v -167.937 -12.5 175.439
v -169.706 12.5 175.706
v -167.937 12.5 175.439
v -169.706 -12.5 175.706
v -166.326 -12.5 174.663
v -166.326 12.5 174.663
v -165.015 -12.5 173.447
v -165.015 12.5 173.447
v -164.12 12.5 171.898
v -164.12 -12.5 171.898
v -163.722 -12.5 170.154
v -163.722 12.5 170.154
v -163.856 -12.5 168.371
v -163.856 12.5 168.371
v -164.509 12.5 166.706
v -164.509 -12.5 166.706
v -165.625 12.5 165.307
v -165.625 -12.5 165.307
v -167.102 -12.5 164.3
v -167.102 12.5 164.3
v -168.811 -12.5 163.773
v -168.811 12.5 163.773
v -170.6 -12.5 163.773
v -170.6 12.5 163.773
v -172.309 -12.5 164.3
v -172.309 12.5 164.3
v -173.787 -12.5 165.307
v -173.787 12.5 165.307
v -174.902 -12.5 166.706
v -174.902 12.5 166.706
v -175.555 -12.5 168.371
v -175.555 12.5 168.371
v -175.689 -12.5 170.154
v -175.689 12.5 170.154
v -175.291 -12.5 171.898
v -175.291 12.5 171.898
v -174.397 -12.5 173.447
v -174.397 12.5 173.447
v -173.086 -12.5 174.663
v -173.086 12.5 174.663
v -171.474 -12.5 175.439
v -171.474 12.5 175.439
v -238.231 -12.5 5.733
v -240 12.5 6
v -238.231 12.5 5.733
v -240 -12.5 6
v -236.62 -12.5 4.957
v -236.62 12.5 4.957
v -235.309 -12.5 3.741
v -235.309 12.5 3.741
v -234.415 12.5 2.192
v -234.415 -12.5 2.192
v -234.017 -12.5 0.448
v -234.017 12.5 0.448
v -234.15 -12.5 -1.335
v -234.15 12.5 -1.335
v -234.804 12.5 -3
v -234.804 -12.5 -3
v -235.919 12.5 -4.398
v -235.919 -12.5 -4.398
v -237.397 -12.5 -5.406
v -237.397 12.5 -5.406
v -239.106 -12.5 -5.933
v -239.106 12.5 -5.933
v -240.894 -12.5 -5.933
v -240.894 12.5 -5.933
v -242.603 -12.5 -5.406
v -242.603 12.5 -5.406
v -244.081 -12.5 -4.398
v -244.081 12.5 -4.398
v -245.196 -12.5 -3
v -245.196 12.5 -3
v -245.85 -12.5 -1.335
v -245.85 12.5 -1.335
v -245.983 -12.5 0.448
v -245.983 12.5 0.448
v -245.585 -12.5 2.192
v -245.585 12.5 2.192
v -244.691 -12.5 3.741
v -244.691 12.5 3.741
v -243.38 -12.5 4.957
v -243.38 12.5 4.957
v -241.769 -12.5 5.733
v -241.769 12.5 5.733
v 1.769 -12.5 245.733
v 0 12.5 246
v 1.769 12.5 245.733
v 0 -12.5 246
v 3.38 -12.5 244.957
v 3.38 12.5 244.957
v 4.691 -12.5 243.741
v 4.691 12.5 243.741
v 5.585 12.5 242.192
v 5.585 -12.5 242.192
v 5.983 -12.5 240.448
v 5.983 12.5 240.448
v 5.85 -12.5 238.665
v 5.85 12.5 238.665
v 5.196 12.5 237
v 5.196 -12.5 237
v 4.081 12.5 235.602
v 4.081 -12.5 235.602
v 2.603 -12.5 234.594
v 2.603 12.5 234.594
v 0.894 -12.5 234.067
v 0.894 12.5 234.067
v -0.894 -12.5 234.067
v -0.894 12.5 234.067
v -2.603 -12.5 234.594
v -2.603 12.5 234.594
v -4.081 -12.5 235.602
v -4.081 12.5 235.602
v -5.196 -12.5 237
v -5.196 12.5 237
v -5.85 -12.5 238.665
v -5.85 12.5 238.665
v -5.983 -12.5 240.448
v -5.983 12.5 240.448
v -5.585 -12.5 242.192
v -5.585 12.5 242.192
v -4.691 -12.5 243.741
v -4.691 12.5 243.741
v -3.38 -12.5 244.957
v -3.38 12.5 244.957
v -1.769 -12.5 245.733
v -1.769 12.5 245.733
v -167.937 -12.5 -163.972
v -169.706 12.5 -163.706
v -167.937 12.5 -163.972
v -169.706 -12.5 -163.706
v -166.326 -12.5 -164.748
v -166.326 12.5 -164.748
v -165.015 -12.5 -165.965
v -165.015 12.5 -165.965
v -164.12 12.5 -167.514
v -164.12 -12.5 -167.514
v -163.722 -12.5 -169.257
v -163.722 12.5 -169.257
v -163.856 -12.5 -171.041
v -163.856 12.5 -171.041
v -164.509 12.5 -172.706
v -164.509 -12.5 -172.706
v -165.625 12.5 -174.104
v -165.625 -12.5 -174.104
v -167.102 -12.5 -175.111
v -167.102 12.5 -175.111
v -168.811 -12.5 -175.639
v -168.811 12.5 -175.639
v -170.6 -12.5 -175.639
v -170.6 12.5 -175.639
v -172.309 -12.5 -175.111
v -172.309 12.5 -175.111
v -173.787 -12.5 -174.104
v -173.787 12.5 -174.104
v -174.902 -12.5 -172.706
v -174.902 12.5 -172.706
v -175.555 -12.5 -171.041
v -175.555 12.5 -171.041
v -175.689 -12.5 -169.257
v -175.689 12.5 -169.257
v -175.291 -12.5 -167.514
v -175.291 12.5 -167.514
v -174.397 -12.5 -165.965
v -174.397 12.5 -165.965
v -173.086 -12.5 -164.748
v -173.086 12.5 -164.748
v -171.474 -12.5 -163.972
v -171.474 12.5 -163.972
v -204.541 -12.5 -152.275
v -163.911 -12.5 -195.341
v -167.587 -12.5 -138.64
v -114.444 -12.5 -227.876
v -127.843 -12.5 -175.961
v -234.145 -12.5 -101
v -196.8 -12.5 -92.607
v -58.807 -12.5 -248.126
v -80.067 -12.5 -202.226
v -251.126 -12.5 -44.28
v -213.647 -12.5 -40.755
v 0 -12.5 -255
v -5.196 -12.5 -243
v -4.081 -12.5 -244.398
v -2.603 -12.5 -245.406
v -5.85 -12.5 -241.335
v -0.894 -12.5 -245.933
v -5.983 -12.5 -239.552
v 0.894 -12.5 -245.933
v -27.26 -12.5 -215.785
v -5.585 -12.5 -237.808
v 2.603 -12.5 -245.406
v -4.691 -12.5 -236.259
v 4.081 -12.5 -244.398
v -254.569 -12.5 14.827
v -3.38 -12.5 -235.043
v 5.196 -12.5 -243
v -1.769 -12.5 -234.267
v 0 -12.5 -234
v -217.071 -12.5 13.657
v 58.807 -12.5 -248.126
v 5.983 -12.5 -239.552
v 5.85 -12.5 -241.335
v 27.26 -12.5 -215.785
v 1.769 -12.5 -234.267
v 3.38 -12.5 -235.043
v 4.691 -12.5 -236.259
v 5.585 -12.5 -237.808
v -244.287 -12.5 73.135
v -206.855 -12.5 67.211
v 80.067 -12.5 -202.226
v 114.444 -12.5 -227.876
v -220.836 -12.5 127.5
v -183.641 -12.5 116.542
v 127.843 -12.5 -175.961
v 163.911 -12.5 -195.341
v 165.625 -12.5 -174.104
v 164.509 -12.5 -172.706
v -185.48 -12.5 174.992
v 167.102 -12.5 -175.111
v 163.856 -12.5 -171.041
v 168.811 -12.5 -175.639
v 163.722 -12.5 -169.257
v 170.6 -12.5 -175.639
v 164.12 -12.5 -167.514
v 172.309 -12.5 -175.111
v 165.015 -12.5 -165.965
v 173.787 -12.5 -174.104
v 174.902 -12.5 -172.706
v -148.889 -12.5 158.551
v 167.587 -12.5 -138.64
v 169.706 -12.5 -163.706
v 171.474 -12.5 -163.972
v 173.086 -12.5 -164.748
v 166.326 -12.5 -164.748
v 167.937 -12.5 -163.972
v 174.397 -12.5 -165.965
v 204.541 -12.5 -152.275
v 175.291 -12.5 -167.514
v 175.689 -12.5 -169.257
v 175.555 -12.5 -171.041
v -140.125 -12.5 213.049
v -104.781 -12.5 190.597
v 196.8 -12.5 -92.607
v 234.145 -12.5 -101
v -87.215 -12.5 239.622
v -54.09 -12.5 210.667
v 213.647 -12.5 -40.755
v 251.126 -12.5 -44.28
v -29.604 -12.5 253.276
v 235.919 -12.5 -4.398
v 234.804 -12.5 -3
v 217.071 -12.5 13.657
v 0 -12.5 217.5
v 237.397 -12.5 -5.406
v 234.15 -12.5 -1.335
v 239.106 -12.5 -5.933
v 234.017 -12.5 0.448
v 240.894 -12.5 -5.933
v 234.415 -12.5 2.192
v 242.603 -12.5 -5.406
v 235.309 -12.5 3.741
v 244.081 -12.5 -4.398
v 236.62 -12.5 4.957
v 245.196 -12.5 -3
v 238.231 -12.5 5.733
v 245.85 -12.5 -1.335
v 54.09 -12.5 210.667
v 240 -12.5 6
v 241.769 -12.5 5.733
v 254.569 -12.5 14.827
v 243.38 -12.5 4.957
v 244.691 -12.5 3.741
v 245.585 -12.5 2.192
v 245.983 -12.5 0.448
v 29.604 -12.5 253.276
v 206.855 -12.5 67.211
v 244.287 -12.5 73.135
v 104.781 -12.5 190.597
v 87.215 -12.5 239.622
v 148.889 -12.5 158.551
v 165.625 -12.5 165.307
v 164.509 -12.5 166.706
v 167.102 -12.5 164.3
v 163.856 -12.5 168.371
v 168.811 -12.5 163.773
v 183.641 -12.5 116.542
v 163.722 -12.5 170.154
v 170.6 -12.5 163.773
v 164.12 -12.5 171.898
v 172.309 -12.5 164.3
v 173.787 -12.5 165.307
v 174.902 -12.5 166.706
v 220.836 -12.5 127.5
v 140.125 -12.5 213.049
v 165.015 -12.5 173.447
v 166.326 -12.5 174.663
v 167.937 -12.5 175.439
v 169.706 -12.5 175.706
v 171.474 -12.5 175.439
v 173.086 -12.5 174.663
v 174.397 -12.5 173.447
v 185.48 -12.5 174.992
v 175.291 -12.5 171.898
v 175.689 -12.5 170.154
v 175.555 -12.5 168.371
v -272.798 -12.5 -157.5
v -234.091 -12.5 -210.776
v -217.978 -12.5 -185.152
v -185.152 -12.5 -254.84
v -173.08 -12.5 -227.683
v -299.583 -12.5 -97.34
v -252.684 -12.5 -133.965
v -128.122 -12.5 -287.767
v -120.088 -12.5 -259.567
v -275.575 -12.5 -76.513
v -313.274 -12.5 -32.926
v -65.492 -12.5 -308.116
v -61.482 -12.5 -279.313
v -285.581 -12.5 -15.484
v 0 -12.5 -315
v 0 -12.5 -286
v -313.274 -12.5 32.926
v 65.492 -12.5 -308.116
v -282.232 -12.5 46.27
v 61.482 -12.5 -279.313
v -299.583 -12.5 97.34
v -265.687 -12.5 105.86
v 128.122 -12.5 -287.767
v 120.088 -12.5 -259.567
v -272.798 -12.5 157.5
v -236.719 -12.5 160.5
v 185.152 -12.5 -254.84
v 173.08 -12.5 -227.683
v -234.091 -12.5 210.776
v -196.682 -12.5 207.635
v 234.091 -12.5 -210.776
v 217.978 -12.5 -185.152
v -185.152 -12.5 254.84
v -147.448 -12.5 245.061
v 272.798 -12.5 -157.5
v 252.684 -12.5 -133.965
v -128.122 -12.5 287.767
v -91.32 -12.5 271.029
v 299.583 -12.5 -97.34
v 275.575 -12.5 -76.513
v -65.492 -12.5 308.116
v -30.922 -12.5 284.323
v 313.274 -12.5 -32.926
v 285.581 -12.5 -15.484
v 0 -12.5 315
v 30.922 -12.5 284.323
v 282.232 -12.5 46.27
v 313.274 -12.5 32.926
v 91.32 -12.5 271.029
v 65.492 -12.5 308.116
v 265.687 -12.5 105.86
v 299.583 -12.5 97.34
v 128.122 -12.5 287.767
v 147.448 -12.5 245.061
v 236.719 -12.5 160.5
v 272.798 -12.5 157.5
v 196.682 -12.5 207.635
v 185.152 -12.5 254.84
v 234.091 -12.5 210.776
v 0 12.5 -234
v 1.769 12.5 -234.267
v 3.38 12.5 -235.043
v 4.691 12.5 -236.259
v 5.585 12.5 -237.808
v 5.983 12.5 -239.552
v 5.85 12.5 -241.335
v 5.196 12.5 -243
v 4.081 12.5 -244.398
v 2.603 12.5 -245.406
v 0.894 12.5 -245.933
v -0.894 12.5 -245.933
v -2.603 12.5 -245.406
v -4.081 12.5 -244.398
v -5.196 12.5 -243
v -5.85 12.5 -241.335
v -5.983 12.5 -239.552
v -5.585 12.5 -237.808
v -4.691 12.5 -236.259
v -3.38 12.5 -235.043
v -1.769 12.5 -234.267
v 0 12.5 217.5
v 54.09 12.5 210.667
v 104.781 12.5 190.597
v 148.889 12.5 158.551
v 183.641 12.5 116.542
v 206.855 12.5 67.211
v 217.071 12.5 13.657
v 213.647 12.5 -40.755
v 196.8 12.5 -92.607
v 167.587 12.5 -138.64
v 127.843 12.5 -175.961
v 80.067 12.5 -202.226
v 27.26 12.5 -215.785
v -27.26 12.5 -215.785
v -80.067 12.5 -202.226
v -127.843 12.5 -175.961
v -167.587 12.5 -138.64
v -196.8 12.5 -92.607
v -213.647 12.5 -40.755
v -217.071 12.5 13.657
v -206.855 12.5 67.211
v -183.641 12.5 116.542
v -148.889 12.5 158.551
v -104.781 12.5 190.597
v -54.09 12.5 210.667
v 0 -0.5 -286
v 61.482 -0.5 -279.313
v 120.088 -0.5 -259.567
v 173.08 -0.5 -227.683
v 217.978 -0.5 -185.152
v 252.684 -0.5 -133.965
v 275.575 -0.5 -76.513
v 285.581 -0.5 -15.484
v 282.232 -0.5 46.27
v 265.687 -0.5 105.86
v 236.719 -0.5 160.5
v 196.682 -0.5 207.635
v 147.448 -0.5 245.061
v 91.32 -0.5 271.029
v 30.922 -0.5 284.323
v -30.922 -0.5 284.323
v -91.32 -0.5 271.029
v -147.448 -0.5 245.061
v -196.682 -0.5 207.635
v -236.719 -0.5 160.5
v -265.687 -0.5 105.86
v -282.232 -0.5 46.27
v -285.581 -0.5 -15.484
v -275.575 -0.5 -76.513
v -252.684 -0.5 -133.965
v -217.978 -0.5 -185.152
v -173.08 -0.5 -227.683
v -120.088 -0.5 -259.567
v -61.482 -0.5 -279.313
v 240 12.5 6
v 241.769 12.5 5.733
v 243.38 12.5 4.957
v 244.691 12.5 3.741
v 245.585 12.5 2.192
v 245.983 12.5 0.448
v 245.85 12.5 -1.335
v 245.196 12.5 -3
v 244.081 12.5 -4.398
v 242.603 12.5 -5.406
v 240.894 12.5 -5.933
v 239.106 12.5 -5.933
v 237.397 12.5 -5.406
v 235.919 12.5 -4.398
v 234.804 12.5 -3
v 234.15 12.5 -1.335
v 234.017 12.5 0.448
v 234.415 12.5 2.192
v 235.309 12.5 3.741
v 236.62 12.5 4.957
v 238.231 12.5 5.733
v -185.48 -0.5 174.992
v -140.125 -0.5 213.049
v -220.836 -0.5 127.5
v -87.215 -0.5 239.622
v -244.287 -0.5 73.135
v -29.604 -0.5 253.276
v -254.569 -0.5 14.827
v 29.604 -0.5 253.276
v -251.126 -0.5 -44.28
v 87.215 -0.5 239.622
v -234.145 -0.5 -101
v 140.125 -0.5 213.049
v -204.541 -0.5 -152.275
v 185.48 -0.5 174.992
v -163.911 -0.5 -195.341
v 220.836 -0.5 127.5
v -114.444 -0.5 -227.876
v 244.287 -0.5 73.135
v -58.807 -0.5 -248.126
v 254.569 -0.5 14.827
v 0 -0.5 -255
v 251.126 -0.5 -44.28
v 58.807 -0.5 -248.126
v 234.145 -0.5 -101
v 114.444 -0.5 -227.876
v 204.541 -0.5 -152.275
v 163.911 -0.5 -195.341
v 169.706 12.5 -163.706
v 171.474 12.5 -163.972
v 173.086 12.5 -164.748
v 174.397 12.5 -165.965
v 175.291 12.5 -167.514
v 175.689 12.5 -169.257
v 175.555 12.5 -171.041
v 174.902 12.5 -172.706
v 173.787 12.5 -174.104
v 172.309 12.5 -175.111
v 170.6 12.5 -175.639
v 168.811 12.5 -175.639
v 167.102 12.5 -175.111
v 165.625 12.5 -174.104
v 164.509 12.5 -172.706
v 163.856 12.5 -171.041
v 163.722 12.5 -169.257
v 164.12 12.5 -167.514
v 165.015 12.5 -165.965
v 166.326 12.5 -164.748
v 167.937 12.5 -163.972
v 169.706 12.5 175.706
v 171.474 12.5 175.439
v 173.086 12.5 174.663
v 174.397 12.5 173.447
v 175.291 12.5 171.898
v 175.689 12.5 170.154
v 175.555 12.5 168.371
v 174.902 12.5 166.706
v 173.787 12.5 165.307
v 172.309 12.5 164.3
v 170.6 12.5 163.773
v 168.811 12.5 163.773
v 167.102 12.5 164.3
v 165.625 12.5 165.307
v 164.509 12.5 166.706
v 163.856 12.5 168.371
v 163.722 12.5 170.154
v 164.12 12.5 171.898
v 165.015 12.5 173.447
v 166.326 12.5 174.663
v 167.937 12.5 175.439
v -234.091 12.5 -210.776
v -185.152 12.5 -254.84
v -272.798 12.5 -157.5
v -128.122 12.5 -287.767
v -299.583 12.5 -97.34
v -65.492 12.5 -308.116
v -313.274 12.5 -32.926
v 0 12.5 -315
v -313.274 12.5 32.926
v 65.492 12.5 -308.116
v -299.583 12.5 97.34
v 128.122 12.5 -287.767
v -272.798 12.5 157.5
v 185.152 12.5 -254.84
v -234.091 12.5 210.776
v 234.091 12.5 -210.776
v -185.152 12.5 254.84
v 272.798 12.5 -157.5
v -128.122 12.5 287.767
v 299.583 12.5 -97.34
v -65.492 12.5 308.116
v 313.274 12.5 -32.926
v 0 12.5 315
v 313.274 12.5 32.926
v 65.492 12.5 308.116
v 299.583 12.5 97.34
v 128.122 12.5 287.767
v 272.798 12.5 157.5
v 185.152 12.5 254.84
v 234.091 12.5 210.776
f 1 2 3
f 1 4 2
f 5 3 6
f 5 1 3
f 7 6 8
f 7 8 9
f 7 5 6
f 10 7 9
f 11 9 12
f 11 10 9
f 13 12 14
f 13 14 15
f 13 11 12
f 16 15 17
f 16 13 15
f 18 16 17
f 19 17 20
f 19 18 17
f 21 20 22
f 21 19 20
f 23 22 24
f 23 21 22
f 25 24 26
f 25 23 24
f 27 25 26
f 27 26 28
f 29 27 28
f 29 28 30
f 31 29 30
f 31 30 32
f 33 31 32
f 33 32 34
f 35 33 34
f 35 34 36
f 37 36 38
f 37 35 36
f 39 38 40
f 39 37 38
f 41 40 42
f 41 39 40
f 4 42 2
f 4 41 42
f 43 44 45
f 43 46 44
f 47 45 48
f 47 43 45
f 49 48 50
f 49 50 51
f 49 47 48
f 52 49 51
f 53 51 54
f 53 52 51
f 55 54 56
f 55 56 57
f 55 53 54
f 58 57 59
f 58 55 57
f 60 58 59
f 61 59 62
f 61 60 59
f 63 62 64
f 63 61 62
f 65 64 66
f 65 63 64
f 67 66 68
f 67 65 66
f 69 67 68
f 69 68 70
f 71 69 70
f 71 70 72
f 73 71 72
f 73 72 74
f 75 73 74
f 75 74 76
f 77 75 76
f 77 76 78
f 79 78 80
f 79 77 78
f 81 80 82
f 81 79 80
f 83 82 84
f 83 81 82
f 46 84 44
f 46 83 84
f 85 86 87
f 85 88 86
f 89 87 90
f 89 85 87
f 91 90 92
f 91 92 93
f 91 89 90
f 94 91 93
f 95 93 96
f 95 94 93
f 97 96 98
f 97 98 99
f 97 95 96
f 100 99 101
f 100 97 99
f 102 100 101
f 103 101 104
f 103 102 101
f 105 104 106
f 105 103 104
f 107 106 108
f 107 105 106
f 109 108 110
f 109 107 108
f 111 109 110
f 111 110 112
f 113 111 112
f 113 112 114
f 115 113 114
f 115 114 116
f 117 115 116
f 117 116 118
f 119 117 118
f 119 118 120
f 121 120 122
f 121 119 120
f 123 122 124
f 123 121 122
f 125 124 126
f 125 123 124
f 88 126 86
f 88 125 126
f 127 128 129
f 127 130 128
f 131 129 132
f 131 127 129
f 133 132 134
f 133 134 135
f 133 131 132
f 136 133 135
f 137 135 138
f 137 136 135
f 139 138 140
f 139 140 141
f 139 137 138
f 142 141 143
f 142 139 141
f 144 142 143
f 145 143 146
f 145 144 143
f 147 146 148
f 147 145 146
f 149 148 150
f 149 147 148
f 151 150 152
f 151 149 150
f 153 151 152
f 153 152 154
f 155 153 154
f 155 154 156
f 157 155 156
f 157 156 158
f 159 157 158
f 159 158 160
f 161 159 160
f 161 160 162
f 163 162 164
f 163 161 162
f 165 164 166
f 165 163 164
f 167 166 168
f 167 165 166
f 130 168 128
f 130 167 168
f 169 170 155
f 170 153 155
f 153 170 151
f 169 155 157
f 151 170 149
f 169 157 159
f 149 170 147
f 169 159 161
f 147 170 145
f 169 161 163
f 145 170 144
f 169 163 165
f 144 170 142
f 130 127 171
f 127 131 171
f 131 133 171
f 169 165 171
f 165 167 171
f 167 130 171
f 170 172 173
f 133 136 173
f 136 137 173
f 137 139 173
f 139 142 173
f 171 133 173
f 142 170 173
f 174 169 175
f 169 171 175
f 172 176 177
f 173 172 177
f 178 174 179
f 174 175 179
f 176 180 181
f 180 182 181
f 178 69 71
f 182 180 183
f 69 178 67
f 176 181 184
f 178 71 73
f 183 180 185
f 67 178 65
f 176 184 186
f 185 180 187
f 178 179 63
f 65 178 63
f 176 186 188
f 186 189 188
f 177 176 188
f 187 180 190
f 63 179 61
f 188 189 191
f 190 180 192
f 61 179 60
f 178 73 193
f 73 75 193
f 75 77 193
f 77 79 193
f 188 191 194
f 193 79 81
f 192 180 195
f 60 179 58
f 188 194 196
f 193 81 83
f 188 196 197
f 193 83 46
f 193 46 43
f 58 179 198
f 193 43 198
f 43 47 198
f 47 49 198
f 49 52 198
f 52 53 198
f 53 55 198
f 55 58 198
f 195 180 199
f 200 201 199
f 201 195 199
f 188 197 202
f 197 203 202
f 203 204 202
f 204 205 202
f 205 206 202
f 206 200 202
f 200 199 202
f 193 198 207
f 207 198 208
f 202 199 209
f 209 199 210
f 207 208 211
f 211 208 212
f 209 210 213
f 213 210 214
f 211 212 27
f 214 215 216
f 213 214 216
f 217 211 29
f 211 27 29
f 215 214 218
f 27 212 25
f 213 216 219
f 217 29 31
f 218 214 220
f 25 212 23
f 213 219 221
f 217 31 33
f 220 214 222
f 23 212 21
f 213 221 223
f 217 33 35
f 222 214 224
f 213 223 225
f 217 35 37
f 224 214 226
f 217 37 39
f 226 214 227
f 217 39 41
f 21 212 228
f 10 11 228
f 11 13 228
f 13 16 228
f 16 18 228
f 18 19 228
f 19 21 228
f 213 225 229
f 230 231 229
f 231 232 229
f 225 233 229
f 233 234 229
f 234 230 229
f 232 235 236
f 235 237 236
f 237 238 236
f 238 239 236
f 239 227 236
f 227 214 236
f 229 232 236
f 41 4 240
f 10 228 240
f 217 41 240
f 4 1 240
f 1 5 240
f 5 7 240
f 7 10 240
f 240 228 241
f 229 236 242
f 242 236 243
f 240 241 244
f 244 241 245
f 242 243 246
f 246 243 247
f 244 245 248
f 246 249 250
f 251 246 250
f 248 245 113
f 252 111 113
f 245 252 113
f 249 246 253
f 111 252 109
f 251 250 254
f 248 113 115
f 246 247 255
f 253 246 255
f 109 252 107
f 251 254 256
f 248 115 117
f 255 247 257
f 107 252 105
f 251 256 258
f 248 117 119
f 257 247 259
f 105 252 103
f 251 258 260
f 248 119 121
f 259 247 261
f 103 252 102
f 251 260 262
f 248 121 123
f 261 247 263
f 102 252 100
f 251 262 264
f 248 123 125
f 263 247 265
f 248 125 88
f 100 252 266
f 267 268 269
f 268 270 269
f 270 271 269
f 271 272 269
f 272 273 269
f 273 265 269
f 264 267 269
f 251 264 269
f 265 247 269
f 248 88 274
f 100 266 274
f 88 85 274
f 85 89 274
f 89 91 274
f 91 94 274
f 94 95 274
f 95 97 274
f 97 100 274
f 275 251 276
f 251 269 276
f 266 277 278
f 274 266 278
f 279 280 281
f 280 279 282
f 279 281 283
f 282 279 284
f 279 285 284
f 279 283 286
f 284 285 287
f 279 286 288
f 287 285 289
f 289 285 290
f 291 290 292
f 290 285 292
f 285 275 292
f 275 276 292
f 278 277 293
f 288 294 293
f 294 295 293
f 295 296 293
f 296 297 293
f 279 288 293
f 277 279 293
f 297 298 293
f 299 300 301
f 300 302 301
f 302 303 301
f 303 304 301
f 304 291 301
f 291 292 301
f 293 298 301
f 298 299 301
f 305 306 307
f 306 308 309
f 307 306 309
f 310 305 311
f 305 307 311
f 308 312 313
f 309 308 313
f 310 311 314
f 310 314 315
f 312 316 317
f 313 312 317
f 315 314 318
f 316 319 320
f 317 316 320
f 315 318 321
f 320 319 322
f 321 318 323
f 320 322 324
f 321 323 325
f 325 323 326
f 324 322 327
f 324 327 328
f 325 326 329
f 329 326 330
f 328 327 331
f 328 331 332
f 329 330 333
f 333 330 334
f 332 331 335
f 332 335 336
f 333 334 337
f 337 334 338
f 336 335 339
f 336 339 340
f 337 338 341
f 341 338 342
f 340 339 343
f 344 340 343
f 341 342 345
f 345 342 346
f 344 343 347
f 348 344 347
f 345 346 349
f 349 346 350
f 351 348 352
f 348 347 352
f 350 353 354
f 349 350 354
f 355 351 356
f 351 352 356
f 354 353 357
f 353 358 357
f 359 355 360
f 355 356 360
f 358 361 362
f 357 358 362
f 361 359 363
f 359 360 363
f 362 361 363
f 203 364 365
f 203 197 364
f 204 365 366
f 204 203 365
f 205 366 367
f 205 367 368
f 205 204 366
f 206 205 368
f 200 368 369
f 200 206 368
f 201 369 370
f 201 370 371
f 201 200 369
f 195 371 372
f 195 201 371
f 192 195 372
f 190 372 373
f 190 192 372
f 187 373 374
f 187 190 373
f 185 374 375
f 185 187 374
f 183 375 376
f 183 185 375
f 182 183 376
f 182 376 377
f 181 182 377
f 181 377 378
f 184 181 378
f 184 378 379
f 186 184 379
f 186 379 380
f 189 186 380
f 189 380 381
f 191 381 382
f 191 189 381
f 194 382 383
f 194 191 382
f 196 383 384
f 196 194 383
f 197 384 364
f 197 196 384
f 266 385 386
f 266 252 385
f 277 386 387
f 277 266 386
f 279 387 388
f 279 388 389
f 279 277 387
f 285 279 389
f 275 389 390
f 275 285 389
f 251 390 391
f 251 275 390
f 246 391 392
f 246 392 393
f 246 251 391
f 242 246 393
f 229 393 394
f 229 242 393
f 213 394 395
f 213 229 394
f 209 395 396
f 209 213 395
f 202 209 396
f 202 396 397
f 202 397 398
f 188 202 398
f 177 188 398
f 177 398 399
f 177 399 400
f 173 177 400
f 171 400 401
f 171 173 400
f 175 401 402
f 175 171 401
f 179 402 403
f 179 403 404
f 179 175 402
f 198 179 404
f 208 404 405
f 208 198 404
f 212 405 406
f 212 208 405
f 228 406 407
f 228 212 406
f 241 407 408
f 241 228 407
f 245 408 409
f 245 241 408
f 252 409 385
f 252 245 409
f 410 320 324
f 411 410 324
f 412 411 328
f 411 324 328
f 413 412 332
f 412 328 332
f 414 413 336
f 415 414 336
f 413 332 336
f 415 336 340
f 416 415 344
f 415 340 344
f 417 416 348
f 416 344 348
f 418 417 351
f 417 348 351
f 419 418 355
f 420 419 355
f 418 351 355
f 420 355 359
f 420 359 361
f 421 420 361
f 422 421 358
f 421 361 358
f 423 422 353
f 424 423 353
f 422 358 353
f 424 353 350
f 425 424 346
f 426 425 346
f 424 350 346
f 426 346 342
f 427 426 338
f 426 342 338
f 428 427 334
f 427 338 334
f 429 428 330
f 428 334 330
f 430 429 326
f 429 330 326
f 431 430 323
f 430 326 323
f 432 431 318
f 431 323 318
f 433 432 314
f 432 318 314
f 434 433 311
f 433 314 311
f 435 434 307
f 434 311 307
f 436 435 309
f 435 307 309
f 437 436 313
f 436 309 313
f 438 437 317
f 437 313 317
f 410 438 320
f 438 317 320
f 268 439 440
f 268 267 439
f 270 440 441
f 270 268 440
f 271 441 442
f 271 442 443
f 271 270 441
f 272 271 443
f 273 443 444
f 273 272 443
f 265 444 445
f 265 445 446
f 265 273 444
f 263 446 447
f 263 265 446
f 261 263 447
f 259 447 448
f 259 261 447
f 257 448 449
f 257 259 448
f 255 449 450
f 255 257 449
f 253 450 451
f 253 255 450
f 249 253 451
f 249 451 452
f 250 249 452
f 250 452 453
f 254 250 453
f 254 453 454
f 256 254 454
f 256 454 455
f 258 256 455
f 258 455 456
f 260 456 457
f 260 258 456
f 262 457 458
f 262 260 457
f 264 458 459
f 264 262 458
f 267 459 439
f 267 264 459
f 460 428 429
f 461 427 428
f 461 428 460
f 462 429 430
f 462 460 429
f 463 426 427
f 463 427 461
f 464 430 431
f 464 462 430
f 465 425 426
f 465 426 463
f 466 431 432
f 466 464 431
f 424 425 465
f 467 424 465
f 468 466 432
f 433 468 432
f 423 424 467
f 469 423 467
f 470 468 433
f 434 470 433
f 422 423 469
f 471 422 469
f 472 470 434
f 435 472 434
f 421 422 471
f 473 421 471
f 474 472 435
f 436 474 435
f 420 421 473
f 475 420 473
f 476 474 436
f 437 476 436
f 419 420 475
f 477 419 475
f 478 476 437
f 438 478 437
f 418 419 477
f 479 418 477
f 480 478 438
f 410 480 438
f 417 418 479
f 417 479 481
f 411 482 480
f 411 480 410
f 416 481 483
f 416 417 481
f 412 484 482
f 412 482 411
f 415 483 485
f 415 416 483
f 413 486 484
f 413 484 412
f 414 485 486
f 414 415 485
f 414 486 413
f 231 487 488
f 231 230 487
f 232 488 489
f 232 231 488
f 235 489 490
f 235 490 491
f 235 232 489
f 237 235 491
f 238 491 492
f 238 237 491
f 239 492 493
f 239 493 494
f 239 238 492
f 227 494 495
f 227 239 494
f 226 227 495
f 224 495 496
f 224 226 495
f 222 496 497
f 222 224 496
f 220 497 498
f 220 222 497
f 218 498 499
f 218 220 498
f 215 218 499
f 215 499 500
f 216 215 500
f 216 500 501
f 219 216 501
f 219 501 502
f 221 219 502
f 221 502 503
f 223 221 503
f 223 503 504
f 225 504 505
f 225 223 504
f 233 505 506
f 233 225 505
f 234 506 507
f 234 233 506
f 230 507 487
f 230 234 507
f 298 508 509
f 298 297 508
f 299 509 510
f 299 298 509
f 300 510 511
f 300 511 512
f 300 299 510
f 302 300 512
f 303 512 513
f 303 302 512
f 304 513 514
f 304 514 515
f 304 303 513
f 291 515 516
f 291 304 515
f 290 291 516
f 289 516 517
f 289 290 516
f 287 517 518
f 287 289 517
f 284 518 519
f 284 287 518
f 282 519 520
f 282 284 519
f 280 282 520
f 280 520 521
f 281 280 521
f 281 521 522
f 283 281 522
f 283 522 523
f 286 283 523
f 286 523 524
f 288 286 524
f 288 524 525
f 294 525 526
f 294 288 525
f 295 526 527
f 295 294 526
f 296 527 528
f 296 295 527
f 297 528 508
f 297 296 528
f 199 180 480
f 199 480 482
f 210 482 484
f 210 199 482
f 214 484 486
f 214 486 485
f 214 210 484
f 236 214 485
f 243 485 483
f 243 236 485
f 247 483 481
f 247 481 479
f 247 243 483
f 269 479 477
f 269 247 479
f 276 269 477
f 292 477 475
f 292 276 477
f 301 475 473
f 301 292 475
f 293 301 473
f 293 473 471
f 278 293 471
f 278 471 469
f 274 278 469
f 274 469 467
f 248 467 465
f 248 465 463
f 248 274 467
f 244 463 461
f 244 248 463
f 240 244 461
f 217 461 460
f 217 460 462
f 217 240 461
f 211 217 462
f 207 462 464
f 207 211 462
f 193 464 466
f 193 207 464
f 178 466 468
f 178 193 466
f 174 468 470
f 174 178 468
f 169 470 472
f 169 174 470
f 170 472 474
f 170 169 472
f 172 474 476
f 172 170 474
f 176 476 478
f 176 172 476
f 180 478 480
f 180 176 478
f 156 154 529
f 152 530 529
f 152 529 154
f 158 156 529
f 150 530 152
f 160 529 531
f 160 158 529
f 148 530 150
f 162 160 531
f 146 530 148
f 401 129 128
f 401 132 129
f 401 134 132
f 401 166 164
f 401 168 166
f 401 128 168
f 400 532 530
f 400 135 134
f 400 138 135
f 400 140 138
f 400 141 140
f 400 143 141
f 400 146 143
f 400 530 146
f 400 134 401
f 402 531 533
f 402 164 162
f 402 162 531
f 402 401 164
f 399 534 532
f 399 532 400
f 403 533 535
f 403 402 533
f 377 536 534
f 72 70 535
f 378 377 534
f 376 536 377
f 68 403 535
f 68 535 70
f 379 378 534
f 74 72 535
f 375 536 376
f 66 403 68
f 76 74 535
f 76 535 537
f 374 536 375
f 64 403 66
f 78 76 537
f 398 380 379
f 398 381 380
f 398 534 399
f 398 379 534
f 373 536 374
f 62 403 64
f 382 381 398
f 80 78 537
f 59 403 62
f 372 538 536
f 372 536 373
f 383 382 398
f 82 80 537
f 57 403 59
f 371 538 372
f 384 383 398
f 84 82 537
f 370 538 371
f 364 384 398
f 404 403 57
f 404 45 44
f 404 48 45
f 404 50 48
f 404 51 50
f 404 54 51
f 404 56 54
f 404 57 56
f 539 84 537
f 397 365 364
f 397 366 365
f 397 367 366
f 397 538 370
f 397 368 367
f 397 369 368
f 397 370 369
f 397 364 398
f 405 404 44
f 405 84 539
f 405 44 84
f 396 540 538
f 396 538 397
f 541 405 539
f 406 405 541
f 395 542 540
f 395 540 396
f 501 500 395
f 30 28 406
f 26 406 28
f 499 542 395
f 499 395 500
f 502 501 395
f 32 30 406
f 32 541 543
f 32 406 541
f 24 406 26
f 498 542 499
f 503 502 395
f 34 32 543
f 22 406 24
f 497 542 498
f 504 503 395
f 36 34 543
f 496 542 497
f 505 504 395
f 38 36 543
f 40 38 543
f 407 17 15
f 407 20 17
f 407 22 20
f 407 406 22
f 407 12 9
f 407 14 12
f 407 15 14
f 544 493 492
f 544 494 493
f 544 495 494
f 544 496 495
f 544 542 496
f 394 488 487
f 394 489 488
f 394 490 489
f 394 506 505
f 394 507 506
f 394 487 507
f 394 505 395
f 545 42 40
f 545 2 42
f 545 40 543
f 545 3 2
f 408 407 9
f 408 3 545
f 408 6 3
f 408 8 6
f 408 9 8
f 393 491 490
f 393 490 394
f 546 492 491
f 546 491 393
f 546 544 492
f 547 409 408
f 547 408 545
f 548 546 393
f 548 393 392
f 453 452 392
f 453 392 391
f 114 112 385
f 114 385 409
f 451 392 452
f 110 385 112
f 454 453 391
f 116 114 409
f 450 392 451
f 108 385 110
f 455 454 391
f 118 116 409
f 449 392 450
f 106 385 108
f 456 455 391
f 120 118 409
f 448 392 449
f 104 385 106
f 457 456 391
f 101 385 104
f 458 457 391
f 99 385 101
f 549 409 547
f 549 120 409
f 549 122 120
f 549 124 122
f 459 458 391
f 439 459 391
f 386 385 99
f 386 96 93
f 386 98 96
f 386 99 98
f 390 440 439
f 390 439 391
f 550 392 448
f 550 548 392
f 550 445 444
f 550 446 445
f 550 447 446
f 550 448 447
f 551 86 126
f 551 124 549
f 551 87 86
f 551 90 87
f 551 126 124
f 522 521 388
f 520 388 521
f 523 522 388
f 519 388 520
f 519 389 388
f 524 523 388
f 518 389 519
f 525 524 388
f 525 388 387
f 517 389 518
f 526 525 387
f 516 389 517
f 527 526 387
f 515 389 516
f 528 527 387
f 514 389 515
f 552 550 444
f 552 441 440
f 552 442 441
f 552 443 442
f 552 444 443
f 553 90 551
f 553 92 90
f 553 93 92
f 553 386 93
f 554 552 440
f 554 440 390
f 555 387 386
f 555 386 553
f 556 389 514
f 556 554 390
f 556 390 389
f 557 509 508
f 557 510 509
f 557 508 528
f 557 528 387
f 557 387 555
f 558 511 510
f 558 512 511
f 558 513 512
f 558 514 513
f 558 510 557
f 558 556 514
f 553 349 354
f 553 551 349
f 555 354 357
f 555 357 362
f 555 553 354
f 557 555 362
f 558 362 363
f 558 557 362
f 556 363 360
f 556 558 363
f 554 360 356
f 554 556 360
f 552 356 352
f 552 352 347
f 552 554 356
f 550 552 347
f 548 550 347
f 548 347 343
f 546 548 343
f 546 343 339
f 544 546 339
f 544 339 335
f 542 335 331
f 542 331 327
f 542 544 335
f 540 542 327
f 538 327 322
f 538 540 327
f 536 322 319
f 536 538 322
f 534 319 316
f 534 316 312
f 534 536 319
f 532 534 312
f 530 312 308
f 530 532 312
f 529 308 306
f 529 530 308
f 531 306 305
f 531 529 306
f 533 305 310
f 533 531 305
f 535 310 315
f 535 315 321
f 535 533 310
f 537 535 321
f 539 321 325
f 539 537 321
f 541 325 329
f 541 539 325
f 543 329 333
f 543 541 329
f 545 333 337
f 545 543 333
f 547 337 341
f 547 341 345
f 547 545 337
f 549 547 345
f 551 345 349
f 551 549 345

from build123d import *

# Parameters (mm, degrees)
SKETCH1_R           = 315
SKETCH1_R_2         = 217.5
SKETCH1_R_3         = 6
BOSS_EXTRUDE1_DEPTH = 12.5
SKETCH2_R           = 286
SKETCH2_R_2         = 255
CUT_EXTRUDE1_DEPTH  = 12


with BuildPart() as part:
    # Sketch1 → Boss-Extrude1 (new, symmetric)
    with BuildSketch(Plane(origin=(0, 0, 0), x_dir=(1, 0, 0), z_dir=(0, 1, 0))):
        with Locations(Location((0, 0, 0), (0, 0, 270))):
            Circle(SKETCH1_R)
        with Locations(Location((0, 0, 0), (0, 0, 270))):
            Circle(SKETCH1_R_2, mode=Mode.SUBTRACT)
        with Locations(Location((0, 240, 0), (0, 0, 270))):
            Circle(SKETCH1_R_3, mode=Mode.SUBTRACT)
        with Locations(Location((169.705627485, 169.705627485, 0), (0, 0, 270))):
            Circle(SKETCH1_R_3, mode=Mode.SUBTRACT)
        with Locations(Location((240, 0, 0), (0, 0, 270))):
            Circle(SKETCH1_R_3, mode=Mode.SUBTRACT)
        with Locations(Location((169.705627485, -169.705627485, 0), (0, 0, 270))):
            Circle(SKETCH1_R_3, mode=Mode.SUBTRACT)
        with Locations(Location((0, -240, 0), (0, 0, 270))):
            Circle(SKETCH1_R_3, mode=Mode.SUBTRACT)
        with Locations(Location((-169.705627485, -169.705627485, 0), (0, 0, 270))):
            Circle(SKETCH1_R_3, mode=Mode.SUBTRACT)
        with Locations(Location((-240, 0, 0), (0, 0, 270))):
            Circle(SKETCH1_R_3, mode=Mode.SUBTRACT)
        with Locations(Location((-169.705627485, 169.705627485, 0), (0, 0, 270))):
            Circle(SKETCH1_R_3, mode=Mode.SUBTRACT)
    extrude(amount=BOSS_EXTRUDE1_DEPTH, both=True)

    # Sketch2 → Cut-Extrude1 (cut)
    with BuildSketch(Plane.XZ.offset(12.5)):
        with Locations(Location((0, 0, 0), (0, 0, 270))):
            Circle(SKETCH2_R)
        with Locations(Location((0, 0, 0), (0, 0, 270))):
            Circle(SKETCH2_R_2, mode=Mode.SUBTRACT)
    extrude(amount=-CUT_EXTRUDE1_DEPTH, mode=Mode.SUBTRACT)


solid = part.part
